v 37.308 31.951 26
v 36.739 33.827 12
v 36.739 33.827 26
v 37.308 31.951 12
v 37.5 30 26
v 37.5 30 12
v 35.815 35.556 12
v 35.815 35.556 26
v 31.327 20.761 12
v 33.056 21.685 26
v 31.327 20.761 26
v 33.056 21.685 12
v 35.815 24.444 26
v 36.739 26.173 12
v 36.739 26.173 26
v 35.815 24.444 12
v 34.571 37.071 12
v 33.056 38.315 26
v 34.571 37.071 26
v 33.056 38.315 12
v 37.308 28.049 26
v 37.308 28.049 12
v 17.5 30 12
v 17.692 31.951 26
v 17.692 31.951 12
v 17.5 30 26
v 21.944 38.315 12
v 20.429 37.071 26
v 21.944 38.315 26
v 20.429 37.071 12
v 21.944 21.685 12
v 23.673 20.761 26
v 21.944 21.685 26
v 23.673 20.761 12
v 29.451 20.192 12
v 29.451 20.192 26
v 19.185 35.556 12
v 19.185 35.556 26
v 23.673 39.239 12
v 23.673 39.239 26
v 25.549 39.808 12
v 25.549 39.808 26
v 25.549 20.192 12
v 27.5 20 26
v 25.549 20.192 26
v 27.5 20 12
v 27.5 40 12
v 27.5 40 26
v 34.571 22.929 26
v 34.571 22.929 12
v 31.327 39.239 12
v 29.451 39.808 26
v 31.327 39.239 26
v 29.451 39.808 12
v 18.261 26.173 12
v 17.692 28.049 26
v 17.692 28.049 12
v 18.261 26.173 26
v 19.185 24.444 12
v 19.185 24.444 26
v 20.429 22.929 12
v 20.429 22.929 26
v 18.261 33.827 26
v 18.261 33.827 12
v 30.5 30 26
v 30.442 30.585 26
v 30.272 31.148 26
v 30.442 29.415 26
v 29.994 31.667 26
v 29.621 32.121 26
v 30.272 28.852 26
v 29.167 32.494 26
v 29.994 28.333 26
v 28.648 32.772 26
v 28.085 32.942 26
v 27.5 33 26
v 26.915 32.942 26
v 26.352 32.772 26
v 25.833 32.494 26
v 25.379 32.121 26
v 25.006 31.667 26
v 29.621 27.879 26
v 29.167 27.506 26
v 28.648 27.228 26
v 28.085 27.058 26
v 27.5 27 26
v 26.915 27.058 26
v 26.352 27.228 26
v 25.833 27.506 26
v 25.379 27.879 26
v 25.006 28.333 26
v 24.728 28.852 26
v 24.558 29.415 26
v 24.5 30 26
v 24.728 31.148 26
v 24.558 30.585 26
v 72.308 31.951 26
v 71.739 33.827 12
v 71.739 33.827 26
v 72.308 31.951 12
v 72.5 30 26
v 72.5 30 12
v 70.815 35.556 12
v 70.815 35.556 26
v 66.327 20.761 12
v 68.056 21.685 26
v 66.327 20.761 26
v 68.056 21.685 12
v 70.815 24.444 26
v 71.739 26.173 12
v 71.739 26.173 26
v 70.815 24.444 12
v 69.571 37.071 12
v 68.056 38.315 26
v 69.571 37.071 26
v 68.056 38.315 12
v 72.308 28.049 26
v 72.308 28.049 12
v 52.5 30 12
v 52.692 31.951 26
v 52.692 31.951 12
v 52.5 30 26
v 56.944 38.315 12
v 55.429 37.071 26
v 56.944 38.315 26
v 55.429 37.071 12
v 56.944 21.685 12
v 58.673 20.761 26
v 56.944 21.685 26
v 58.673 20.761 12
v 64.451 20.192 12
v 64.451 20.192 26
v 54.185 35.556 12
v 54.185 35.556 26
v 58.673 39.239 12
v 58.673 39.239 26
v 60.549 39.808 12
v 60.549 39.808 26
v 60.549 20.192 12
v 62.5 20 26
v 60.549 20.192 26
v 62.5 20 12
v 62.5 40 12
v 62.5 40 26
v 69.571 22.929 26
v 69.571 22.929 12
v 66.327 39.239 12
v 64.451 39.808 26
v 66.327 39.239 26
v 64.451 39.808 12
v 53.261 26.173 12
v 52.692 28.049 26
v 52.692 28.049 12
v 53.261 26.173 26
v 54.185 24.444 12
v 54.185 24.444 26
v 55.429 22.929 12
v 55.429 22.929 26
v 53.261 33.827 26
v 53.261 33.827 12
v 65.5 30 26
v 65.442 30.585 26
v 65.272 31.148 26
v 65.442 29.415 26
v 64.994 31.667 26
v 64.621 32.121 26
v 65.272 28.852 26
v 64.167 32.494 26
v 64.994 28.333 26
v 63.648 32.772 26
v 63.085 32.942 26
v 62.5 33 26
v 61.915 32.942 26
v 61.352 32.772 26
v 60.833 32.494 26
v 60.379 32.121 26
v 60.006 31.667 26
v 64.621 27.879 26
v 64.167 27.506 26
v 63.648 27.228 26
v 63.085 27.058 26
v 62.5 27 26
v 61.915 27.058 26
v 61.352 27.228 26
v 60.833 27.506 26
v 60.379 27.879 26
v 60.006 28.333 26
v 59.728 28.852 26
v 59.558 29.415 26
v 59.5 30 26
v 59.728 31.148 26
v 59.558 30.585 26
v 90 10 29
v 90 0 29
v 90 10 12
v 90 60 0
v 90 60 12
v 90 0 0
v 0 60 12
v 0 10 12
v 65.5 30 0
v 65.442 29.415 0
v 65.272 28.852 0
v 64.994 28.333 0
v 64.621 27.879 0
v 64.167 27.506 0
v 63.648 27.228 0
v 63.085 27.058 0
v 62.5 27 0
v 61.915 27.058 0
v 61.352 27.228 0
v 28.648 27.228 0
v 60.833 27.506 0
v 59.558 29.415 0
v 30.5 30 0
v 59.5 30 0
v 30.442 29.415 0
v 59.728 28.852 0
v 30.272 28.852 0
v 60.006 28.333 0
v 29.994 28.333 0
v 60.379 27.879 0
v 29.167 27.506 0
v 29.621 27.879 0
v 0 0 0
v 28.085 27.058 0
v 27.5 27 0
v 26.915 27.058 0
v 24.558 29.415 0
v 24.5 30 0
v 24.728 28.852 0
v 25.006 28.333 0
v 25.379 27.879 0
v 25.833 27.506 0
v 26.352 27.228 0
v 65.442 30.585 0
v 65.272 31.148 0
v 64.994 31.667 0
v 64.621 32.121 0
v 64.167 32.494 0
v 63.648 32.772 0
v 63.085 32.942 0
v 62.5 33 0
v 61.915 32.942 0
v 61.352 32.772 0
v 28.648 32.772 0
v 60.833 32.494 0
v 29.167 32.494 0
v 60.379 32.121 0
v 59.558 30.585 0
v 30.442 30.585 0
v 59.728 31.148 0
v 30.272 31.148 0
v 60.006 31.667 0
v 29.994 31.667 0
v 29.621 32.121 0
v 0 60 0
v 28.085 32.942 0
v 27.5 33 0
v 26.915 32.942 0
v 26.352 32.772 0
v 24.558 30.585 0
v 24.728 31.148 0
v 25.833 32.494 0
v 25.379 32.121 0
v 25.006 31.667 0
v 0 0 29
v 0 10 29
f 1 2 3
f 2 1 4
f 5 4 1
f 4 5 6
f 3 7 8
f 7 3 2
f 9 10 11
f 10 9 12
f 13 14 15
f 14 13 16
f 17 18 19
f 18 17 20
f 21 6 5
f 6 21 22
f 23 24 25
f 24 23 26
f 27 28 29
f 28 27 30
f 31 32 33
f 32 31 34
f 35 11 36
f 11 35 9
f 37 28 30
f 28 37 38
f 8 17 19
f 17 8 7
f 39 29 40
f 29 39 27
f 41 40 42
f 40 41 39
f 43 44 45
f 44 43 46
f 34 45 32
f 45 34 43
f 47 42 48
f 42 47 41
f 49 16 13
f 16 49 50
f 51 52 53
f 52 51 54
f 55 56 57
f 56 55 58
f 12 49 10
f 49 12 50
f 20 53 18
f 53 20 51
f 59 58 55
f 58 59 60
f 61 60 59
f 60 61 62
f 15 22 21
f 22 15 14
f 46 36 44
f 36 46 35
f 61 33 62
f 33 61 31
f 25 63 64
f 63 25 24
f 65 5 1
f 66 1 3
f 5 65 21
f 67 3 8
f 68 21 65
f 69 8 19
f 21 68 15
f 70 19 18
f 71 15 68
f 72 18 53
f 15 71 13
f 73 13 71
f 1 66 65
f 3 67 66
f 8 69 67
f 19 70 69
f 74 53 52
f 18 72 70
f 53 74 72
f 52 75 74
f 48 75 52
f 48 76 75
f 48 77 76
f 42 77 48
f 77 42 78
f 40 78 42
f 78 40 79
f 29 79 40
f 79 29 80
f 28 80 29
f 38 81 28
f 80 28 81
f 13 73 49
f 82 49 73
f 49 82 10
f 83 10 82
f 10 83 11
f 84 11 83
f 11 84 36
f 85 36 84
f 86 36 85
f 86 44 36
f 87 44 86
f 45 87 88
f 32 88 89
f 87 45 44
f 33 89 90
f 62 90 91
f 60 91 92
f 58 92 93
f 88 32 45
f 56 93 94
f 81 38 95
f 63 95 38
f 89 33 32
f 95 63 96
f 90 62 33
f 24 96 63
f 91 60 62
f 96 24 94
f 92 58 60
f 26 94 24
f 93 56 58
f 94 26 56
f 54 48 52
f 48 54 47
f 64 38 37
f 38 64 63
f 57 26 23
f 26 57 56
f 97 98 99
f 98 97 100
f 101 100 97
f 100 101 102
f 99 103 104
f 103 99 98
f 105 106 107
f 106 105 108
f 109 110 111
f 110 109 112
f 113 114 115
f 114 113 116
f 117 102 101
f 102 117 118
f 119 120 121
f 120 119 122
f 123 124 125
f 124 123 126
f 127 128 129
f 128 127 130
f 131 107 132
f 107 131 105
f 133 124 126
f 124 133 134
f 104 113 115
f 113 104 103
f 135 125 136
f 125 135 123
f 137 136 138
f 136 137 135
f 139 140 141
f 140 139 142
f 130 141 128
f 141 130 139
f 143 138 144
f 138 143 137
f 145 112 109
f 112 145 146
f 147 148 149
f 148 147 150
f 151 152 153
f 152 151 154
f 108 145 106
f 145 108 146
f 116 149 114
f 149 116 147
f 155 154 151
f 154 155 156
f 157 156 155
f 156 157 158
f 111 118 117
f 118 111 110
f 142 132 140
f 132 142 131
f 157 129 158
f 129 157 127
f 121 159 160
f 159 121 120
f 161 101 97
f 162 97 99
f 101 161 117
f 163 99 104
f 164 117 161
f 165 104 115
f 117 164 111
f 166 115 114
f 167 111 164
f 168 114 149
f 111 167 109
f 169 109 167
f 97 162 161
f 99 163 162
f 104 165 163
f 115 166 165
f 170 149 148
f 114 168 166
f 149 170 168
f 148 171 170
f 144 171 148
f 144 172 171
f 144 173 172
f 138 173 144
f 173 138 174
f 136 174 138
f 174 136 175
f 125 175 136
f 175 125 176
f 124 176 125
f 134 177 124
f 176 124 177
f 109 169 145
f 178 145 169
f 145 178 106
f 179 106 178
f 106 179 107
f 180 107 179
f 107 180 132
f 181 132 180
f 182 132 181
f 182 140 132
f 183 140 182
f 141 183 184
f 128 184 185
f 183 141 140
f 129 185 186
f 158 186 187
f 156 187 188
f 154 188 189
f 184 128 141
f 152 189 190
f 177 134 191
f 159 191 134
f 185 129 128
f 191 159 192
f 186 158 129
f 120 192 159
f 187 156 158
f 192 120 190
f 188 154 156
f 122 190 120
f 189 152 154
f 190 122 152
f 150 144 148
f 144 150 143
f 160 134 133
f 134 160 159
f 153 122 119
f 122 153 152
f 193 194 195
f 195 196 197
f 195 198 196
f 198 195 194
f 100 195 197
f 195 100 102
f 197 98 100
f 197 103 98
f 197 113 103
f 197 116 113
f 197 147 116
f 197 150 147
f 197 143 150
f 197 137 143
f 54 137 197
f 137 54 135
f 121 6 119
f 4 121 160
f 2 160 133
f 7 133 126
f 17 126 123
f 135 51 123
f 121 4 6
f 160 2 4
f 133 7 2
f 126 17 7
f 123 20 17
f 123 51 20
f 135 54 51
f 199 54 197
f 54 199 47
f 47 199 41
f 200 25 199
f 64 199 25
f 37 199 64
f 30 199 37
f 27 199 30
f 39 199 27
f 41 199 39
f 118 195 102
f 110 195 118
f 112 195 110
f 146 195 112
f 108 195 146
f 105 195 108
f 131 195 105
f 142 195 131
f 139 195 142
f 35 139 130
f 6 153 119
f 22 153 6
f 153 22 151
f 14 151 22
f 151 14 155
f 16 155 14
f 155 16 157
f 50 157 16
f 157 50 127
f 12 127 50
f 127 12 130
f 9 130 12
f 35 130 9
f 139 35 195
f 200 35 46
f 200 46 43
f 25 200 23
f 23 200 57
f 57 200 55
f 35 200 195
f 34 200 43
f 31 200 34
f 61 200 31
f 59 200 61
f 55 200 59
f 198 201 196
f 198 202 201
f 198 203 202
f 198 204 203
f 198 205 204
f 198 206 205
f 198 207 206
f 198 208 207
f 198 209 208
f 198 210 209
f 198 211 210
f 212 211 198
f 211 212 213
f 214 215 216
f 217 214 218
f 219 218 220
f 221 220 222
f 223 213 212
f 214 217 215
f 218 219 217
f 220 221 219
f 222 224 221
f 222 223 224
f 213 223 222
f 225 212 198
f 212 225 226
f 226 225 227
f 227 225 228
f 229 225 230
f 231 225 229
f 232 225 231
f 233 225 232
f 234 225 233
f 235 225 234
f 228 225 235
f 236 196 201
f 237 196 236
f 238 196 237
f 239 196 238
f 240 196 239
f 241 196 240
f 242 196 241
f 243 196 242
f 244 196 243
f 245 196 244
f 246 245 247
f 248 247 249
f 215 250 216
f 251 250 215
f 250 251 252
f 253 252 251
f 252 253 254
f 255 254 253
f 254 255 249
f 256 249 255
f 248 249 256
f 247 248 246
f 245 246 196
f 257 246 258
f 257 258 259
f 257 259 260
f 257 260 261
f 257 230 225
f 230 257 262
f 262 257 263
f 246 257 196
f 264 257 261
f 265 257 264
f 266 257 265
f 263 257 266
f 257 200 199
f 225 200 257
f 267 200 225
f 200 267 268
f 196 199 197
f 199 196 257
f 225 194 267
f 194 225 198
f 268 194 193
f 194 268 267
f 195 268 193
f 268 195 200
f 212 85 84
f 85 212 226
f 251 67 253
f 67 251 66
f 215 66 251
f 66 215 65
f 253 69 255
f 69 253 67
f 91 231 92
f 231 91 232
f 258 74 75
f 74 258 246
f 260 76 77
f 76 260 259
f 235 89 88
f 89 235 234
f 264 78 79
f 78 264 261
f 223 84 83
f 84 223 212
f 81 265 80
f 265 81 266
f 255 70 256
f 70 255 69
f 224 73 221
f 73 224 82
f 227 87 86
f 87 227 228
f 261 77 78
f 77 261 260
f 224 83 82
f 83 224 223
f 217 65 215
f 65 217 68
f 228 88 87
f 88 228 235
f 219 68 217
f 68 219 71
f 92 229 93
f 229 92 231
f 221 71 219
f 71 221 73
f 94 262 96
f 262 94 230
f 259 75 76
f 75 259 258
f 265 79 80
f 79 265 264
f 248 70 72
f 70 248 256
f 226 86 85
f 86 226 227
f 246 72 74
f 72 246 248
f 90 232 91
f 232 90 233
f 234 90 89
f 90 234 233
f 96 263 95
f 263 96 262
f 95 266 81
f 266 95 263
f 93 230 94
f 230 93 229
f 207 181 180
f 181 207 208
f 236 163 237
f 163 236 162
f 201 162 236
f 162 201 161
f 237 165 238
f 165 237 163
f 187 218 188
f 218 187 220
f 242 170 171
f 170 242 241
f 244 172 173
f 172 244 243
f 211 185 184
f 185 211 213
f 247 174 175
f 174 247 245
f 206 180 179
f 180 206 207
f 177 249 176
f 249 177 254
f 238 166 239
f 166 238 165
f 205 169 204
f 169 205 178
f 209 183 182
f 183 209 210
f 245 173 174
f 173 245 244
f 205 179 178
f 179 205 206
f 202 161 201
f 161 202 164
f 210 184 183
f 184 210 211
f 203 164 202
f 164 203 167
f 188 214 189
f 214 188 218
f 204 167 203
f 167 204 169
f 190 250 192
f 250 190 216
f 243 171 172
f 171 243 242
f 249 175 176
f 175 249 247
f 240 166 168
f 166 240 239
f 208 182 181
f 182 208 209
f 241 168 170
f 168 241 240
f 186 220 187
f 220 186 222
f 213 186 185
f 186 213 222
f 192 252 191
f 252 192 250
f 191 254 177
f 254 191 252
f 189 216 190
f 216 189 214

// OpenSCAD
$fn = 32;

// ----------------------------------------------------------------------
// Drill jig: fence jig
// ----------------------------------------------------------------------

// --- parameters (mm) ---
plate_l = 90;             // plate length, X
plate_w = 60;             // plate width, Y
plate_t = 12;             // plate thickness
boss_d = 20;              // guide boss diameter
boss_h = 15;              // boss height above the plate
guide_d = 6;              // guide hole diameter
boss_pitch = 35;          // boss pitch
fence_h = 18;             // fence height above the plate
fence_t = 10;             // fence thickness

n_boss = 2;  // guide bosses
boss_x0 = (plate_l - (n_boss - 1) * boss_pitch) / 2;  // first boss X
boss_top = plate_t - 1 + boss_h;  // boss crown height
fence_top = plate_t - 1 + fence_h;  // fence crown height
total_h = max([fence_top, boss_top]);  // overall height

difference() {
  union() {
  cube([plate_l, plate_w, plate_t]);
  for (i = [0 : n_boss - 1])
    translate([boss_x0 + i * boss_pitch, plate_w / 2, plate_t - 1])
      cylinder(h = boss_h, d = boss_d);
  translate([0, 0, plate_t - 1]) cube([plate_l, fence_t, fence_h]);
  }
  for (i = [0 : n_boss - 1])
    translate([boss_x0 + i * boss_pitch, plate_w / 2, -1])
      cylinder(h = plate_t + boss_h, d = guide_d);
}
